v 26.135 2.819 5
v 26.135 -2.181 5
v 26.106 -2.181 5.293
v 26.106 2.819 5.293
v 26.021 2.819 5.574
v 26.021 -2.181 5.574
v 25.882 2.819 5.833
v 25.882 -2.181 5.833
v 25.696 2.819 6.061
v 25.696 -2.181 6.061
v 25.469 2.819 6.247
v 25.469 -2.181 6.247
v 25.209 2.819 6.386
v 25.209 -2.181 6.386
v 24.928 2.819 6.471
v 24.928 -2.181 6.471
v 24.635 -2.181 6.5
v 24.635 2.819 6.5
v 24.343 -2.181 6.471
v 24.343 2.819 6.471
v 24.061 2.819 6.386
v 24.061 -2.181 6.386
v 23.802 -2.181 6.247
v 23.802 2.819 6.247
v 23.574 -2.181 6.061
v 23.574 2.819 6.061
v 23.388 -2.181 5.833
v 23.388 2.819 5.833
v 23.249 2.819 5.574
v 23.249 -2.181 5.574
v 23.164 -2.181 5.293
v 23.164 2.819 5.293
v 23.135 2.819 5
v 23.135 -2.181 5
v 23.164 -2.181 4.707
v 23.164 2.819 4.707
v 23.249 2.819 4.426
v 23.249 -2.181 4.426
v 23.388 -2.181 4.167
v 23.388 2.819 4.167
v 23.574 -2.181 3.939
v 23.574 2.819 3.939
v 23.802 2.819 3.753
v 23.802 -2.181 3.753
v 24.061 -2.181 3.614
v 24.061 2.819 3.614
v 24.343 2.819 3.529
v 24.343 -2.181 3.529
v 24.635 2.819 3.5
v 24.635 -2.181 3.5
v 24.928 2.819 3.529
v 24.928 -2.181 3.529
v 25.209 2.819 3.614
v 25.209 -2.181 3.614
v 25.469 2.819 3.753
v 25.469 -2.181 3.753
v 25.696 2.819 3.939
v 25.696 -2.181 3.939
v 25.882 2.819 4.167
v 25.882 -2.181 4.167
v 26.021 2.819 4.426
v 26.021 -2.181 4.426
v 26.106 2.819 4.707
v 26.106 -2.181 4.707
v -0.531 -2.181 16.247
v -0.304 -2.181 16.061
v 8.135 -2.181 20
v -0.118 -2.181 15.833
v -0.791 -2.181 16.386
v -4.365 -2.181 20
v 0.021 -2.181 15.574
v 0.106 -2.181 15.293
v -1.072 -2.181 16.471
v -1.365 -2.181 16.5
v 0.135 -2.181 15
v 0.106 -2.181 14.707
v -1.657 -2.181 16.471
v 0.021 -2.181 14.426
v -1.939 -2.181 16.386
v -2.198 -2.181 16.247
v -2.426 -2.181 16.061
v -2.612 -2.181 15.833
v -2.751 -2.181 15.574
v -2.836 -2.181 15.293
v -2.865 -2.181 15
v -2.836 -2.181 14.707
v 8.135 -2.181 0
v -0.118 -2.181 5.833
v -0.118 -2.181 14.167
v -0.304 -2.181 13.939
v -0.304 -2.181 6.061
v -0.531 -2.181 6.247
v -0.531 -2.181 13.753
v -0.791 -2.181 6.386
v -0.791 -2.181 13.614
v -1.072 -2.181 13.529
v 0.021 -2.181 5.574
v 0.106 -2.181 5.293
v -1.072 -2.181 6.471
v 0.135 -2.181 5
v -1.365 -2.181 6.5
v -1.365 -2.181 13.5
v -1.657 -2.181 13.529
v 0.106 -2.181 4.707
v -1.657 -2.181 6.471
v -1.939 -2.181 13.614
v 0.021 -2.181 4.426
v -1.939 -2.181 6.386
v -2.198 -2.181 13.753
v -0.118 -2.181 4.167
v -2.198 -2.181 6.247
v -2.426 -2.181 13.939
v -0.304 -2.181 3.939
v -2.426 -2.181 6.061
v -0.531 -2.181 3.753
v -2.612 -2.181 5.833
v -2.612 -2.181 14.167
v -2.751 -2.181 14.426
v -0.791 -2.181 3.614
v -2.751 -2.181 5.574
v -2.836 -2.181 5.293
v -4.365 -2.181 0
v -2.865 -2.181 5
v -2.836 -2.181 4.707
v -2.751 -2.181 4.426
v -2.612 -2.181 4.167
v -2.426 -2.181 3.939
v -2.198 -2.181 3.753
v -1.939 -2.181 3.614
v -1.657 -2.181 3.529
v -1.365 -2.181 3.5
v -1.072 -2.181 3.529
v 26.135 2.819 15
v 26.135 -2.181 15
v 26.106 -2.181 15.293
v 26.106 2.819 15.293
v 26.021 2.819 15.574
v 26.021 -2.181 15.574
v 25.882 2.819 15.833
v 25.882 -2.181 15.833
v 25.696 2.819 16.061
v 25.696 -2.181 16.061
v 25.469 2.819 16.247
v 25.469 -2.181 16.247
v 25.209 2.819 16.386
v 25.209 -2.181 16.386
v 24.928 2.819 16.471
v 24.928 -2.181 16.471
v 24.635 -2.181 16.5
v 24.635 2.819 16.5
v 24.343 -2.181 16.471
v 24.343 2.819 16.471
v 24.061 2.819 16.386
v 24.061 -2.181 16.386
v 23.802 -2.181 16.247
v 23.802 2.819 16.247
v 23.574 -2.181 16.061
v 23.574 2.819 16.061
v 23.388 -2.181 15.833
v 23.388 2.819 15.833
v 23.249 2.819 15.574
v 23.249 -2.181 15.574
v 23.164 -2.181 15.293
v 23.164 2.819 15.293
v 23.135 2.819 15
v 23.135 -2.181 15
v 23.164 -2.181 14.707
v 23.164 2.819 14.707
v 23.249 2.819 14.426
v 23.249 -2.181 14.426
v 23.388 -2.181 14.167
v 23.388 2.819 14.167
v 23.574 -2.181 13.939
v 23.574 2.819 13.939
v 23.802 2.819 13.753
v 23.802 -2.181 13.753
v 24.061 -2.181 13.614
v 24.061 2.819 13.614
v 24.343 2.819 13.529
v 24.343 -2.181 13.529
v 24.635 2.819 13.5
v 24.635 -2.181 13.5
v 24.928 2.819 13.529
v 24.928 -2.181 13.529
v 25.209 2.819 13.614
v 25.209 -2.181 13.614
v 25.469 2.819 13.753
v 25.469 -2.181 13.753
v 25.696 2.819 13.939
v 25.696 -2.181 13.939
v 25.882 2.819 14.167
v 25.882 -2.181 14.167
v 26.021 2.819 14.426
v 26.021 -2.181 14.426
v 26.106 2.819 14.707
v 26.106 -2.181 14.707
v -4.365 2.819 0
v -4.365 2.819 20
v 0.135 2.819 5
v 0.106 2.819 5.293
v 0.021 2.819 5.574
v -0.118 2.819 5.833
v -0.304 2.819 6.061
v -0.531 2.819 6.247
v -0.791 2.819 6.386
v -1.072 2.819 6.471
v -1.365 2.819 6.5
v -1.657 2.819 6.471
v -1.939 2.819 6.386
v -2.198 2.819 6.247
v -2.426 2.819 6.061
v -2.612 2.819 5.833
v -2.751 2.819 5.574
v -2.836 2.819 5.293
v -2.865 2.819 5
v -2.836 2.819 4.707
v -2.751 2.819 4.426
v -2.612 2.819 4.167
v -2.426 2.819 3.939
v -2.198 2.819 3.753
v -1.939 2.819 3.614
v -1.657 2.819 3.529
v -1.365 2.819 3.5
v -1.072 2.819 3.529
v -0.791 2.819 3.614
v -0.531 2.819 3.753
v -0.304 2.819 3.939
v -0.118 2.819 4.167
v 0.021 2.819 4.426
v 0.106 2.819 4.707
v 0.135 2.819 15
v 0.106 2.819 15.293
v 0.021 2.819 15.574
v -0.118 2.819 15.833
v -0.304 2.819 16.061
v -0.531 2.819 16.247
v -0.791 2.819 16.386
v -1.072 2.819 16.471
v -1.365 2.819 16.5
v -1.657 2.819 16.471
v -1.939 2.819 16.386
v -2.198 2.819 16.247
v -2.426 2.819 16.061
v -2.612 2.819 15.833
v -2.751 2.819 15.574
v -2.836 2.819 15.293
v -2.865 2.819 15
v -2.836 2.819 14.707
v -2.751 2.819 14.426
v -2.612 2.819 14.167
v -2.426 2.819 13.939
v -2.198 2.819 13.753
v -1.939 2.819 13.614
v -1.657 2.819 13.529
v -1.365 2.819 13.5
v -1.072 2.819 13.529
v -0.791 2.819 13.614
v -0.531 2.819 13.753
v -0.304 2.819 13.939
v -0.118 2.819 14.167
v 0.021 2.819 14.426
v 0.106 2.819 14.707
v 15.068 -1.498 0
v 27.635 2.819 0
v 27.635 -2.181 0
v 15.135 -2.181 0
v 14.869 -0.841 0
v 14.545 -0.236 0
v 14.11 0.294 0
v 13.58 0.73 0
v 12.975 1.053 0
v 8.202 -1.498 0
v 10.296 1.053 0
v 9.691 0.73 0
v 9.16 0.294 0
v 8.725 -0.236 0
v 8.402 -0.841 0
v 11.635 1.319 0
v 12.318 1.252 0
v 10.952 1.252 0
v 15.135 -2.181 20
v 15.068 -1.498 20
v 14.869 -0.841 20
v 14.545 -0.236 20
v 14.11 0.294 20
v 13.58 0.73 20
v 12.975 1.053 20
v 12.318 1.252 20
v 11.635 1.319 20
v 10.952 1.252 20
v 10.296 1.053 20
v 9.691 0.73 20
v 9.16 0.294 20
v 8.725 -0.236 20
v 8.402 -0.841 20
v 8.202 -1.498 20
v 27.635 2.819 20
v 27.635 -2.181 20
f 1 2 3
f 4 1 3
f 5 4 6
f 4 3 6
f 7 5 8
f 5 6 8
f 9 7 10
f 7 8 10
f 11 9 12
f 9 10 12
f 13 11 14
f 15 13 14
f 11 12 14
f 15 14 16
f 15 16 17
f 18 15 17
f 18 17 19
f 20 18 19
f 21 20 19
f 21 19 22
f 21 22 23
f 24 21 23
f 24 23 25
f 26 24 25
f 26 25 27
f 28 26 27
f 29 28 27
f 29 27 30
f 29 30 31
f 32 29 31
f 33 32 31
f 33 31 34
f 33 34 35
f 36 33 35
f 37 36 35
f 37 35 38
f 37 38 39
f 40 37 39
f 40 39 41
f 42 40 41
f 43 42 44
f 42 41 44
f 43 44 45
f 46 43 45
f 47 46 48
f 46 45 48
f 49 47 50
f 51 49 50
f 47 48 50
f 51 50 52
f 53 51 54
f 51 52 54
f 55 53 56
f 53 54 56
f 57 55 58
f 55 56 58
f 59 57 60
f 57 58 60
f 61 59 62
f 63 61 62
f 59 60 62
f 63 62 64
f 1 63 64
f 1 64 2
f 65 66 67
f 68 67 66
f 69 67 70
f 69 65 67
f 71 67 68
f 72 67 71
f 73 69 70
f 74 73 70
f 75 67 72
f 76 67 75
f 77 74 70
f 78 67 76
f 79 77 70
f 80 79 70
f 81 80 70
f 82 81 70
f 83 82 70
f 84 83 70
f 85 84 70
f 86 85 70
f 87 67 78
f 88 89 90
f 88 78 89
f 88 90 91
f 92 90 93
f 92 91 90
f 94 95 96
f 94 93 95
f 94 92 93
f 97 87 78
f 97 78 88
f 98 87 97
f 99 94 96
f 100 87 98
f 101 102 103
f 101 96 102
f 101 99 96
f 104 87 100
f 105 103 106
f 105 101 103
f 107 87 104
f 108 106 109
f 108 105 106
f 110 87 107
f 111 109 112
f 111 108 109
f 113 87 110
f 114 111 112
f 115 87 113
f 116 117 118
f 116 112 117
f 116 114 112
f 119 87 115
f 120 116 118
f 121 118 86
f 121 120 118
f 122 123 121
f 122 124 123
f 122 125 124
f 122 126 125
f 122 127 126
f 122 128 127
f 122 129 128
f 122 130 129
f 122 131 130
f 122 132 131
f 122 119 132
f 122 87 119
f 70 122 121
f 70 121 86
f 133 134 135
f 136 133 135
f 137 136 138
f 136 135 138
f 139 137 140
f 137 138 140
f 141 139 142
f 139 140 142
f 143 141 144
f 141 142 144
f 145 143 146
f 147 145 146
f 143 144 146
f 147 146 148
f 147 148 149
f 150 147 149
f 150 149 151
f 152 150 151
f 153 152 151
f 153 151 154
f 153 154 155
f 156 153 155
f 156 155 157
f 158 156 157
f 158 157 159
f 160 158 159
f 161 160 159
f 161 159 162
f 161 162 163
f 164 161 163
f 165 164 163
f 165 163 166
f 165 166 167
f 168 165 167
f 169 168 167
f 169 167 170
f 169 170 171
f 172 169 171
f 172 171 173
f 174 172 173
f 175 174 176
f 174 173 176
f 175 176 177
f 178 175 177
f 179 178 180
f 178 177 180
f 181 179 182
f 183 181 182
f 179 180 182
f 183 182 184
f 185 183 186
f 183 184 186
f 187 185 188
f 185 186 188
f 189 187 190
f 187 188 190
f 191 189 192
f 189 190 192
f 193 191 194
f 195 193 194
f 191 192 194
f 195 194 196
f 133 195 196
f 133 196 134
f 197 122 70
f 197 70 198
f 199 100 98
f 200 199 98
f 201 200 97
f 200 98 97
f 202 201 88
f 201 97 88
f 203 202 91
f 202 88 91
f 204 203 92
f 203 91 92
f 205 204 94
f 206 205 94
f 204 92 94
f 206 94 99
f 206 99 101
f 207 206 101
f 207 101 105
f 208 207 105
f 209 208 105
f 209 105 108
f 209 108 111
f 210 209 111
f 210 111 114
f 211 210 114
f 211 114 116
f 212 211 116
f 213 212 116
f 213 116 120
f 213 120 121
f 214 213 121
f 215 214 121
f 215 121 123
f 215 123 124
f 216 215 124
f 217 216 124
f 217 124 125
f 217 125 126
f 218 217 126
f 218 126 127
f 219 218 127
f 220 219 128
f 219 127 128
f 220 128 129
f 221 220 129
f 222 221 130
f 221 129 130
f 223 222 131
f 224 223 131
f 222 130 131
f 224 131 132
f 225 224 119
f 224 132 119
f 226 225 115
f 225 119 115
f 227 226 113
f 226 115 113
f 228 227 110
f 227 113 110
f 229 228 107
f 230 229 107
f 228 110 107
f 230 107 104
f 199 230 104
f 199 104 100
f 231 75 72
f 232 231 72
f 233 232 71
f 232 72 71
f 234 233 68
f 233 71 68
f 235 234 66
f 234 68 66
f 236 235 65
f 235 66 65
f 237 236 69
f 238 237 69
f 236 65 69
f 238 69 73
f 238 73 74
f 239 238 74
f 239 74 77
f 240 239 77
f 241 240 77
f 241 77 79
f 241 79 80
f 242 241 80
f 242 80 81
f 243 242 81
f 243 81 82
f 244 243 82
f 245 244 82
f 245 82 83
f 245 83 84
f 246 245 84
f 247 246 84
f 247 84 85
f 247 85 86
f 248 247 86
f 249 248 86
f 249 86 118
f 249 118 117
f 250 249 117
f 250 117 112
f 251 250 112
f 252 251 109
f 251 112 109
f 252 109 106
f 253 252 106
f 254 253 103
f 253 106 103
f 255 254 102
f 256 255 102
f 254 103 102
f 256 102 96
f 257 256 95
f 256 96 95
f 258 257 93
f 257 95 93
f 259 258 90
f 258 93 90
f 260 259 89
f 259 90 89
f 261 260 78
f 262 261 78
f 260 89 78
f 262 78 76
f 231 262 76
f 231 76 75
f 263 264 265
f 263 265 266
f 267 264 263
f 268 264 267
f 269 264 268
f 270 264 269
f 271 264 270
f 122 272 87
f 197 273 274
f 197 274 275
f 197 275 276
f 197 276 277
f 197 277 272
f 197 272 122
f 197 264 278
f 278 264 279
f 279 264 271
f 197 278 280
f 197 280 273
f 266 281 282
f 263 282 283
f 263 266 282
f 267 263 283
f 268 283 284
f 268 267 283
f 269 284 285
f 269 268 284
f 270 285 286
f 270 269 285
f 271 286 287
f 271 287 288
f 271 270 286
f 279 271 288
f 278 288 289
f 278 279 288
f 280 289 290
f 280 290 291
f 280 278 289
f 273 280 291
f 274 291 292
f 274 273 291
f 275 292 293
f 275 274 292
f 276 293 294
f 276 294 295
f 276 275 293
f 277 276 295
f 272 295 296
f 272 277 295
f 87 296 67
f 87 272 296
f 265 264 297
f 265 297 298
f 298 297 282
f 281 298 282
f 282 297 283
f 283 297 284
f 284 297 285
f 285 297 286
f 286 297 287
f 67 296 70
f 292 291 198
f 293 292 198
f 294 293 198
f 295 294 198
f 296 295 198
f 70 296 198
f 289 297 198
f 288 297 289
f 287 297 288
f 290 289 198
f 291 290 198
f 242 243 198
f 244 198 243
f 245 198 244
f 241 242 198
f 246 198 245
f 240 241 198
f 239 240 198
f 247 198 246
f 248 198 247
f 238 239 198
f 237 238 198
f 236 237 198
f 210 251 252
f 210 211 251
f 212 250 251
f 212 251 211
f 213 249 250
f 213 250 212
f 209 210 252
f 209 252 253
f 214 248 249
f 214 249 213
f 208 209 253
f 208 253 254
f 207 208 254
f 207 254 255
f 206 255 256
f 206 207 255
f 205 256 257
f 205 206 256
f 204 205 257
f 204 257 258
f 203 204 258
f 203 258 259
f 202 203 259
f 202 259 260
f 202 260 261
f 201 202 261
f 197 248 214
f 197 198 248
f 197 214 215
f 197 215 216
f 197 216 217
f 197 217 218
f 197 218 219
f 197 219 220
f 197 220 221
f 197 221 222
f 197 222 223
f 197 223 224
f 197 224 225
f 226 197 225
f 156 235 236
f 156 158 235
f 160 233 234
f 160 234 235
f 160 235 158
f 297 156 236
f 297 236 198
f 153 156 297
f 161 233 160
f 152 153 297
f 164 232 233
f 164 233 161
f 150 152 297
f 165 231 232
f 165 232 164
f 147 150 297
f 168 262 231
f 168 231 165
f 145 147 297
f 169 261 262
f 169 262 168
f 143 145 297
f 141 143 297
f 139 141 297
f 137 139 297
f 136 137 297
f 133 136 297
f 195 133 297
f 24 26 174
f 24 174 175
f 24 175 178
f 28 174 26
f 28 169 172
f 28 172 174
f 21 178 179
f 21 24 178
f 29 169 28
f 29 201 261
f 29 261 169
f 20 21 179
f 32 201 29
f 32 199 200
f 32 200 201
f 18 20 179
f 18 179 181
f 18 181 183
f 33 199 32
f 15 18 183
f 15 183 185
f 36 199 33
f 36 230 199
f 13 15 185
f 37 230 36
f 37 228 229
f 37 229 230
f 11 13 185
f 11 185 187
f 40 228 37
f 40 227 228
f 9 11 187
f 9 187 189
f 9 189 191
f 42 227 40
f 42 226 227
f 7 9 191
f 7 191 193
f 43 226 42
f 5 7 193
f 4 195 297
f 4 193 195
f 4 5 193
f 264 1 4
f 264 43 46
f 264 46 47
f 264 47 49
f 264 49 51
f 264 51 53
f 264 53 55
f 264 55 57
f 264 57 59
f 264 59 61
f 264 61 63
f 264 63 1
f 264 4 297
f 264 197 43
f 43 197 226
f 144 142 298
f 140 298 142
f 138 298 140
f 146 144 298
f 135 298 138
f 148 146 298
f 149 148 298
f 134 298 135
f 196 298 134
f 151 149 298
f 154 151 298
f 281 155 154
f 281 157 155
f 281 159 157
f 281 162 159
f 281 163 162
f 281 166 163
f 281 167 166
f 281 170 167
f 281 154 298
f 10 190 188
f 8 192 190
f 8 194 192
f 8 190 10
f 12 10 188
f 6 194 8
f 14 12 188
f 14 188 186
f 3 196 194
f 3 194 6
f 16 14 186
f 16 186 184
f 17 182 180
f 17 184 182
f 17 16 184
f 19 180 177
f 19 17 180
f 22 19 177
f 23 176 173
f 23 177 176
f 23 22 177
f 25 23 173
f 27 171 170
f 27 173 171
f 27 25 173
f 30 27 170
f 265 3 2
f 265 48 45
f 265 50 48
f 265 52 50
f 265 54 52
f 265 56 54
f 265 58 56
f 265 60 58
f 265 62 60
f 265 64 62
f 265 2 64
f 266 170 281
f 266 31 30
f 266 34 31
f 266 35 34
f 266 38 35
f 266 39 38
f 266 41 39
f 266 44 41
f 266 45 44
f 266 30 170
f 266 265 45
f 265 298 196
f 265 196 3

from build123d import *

# Parameters (mm, degrees)
BOSS_EXTRUDE1_DEPTH = 20
CUT_EXTRUDE1_REACH  = 36.478
SKETCH3_R           = 1.5


with BuildPart() as part:
    # Sketch1 → Boss-Extrude1 (new body)
    with BuildSketch(Plane.XY):
        with BuildLine():
            Line((8.135150199, -2.180546666), (-4.364849801, -2.180546666))
            Line((-4.364849801, -2.180546666), (-4.364849801, 2.819453334))
            Line((-4.364849801, 2.819453334), (27.635150199, 2.819453334))
            Line((27.635150199, 2.819453334), (27.635150199, -2.180546666))
            Line((27.635150199, -2.180546666), (15.135150199, -2.180546666))
            ThreePointArc((15.135150199, -2.180546666), (11.635150199, 1.319453334), (8.135150199, -2.180546666))
        make_face()
    extrude(amount=BOSS_EXTRUDE1_DEPTH)

    # Sketch3 → Cut-Extrude1 (cut, up to next)
    with BuildSketch(Plane.XZ.offset(2.180546666), mode=Mode.PRIVATE) as cut_extrude1_sk1:
        with Locations((-1.364849801, 15)):
            Circle(SKETCH3_R)
    cut_extrude1_tool1 = extrude(cut_extrude1_sk1.sketch, amount=-CUT_EXTRUDE1_REACH, mode=Mode.PRIVATE) & part.part
    # Sketch3 → Cut-Extrude1 (cut, up to next)
    with BuildSketch(Plane.XZ.offset(2.180546666), mode=Mode.PRIVATE) as cut_extrude1_sk2:
        with Locations((-1.364849801, 5)):
            Circle(SKETCH3_R)
    cut_extrude1_tool2 = extrude(cut_extrude1_sk2.sketch, amount=-CUT_EXTRUDE1_REACH, mode=Mode.PRIVATE) & part.part
    # Sketch3 → Cut-Extrude1 (cut, up to next)
    with BuildSketch(Plane.XZ.offset(2.180546666), mode=Mode.PRIVATE) as cut_extrude1_sk3:
        with Locations((24.635150199, 15)):
            Circle(SKETCH3_R)
    cut_extrude1_tool3 = extrude(cut_extrude1_sk3.sketch, amount=-CUT_EXTRUDE1_REACH, mode=Mode.PRIVATE) & part.part
    # Sketch3 → Cut-Extrude1 (cut, up to next)
    with BuildSketch(Plane.XZ.offset(2.180546666), mode=Mode.PRIVATE) as cut_extrude1_sk4:
        with Locations((24.635150199, 5)):
            Circle(SKETCH3_R)
    cut_extrude1_tool4 = extrude(cut_extrude1_sk4.sketch, amount=-CUT_EXTRUDE1_REACH, mode=Mode.PRIVATE) & part.part
    add(cut_extrude1_tool1.solids().sort_by_distance((-1.36485, -2.180547, 15))[0], mode=Mode.SUBTRACT)
    add(cut_extrude1_tool2.solids().sort_by_distance((-1.36485, -2.180547, 5))[0], mode=Mode.SUBTRACT)
    add(cut_extrude1_tool3.solids().sort_by_distance((24.63515, -2.180547, 15))[0], mode=Mode.SUBTRACT)
    add(cut_extrude1_tool4.solids().sort_by_distance((24.63515, -2.180547, 5))[0], mode=Mode.SUBTRACT)


solid = part.part
